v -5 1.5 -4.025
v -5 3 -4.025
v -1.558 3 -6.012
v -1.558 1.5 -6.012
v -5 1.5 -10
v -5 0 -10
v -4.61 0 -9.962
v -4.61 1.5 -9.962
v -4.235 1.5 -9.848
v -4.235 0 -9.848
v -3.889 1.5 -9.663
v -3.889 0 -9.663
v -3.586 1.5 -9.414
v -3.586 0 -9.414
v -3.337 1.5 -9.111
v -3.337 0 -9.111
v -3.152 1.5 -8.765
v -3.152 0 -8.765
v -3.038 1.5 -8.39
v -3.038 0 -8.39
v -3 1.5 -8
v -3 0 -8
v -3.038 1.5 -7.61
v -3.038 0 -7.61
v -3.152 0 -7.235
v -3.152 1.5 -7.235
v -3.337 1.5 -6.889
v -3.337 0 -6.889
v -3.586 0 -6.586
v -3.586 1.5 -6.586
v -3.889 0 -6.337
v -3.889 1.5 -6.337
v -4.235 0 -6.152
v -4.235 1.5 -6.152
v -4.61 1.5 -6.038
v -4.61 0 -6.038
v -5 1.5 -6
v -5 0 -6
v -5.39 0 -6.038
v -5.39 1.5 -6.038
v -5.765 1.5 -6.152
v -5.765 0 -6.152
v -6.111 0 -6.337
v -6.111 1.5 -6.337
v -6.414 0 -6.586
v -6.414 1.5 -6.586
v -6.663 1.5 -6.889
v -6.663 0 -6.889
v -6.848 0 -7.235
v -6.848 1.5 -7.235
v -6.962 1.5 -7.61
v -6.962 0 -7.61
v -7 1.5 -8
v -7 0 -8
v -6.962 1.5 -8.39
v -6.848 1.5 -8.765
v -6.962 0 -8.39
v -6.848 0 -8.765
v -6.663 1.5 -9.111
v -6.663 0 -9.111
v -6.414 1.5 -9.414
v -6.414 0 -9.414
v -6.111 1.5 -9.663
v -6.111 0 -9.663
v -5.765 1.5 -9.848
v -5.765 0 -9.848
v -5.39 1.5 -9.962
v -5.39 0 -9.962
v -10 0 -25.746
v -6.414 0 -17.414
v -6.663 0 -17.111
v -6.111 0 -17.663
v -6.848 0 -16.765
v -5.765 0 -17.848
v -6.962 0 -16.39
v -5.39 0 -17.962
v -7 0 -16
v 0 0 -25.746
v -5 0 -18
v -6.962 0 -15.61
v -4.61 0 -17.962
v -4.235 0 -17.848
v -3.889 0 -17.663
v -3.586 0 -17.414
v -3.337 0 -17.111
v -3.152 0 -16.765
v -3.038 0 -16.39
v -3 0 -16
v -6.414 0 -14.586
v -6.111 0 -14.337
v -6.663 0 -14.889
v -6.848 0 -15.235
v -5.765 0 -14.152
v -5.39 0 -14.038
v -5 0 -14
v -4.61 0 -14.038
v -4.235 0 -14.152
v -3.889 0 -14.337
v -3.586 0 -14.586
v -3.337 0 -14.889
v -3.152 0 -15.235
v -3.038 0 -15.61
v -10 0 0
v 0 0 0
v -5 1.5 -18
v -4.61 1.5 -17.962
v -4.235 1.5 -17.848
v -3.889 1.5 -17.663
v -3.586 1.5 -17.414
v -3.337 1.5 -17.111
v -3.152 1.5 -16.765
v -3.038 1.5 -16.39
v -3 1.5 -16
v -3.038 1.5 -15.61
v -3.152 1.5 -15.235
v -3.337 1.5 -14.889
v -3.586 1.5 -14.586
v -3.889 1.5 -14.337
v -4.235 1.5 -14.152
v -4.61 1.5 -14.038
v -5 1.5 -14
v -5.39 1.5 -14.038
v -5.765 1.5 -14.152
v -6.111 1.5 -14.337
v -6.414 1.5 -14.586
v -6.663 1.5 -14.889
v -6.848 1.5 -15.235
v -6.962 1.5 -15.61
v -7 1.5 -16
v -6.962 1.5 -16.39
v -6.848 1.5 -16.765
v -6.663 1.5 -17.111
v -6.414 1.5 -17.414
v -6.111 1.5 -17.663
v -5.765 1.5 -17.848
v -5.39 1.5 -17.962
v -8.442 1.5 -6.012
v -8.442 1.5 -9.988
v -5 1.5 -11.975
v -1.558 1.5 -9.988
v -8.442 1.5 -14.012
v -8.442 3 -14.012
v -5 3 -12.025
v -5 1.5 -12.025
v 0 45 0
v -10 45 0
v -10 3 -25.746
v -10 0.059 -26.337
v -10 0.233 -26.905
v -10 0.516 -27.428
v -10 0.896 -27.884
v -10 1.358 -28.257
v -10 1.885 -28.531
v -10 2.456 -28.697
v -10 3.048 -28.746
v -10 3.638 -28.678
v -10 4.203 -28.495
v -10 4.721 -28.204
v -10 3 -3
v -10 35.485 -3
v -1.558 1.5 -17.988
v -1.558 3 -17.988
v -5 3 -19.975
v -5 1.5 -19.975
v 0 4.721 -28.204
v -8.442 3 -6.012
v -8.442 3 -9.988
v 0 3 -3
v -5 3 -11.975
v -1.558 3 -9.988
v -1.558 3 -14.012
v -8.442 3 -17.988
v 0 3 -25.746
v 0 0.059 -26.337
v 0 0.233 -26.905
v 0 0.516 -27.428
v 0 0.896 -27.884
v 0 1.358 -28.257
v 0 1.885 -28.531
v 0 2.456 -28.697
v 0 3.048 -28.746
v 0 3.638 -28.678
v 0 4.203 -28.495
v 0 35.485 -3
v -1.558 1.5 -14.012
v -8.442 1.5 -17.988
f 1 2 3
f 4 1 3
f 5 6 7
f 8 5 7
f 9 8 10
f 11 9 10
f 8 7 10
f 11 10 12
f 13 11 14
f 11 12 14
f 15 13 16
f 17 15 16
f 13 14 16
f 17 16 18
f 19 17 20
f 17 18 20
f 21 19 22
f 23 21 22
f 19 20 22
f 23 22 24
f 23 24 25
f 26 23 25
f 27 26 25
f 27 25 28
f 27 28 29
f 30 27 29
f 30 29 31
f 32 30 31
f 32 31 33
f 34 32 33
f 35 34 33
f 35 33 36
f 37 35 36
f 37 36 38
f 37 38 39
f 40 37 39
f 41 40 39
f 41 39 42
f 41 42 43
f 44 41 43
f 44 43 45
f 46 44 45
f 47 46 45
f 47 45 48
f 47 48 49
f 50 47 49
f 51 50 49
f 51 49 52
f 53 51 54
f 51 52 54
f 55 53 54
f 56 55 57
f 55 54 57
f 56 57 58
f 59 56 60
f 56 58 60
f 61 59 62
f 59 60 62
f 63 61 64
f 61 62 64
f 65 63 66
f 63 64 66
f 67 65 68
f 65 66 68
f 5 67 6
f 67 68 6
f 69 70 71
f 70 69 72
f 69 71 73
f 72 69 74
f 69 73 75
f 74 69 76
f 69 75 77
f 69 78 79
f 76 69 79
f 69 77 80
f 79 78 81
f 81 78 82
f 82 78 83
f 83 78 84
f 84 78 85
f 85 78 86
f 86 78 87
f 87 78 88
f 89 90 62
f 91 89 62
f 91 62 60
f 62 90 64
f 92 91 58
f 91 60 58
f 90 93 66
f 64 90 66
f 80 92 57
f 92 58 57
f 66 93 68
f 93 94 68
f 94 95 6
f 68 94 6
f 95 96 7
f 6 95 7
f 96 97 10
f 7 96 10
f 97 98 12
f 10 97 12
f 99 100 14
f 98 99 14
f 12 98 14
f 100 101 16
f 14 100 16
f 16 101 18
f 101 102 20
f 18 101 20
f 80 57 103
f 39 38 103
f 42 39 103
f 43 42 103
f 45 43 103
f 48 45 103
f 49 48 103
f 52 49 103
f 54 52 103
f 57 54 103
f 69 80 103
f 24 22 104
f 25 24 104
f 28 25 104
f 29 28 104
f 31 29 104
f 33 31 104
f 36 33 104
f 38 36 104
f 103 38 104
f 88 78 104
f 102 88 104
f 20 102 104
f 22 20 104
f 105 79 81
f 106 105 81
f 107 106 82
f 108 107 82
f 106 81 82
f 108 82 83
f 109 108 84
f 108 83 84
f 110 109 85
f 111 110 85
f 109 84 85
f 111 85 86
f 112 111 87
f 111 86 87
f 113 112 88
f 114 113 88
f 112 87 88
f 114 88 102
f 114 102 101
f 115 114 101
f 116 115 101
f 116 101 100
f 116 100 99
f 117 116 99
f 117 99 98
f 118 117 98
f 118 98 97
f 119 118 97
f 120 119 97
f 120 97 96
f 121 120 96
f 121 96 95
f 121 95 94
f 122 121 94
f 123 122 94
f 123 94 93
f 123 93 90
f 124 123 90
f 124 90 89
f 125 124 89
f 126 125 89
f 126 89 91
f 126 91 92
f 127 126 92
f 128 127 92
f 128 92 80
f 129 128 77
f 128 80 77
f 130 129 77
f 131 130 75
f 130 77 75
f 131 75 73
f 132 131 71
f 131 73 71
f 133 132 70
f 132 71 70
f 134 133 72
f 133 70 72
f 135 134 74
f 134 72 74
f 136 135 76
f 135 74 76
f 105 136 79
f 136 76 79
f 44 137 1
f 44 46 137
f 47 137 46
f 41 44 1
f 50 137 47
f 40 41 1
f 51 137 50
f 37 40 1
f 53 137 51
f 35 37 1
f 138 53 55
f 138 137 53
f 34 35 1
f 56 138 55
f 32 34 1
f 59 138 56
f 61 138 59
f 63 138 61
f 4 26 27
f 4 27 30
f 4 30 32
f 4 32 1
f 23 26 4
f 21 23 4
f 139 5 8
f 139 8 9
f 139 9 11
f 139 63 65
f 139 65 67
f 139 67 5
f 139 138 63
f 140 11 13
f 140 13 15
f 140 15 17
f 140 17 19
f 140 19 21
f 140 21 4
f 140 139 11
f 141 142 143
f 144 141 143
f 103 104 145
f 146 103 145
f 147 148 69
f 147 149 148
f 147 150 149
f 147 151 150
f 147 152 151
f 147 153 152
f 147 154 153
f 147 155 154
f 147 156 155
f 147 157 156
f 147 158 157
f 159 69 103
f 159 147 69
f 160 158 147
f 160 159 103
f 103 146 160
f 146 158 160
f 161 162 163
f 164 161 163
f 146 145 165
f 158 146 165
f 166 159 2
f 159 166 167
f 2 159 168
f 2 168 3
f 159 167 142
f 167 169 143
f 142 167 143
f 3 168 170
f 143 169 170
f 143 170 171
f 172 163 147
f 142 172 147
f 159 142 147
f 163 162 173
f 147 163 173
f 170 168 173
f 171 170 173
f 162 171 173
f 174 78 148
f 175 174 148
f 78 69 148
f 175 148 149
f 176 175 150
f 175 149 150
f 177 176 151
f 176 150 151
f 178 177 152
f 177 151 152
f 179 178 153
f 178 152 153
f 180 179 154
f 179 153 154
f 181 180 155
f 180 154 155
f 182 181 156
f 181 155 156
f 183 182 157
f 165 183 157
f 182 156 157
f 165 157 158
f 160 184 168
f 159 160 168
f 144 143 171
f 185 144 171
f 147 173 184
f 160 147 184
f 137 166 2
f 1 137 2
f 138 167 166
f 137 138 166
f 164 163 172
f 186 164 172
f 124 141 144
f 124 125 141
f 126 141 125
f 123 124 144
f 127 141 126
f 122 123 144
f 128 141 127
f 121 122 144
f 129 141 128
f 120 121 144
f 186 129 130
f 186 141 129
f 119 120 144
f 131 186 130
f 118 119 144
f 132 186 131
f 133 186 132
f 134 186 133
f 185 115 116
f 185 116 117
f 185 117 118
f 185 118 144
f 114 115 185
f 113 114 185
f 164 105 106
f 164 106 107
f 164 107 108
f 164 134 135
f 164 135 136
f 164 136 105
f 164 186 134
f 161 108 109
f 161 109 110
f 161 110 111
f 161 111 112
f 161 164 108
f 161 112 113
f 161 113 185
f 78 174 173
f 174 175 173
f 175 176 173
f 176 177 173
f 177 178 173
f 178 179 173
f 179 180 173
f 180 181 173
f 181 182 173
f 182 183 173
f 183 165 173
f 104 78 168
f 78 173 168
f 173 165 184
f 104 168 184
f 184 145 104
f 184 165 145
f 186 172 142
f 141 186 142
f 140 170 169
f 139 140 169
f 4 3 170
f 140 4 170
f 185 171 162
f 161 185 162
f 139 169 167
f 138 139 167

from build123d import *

# Parameters (mm, degrees)
BOSS_EXTRUDE1_DEPTH = 10
CUT_EXTRUDE1_DEPTH  = 56.837607918
SKETCH3_R           = 2
CUT_EXTRUDE2_DEPTH  = 3
CUT_EXTRUDE3_DEPTH  = 1.5
FILLET1_R           = 3


with BuildPart() as part:
    # Sketch1 → Boss-Extrude1 (new body)
    with BuildSketch(Plane(origin=(0, 0, 0), x_dir=(0, 0, -1), z_dir=(1, 0, 0))):
        Polygon((0, 0), (0, 45), (31.509339219, 0), align=None)
    extrude(amount=-BOSS_EXTRUDE1_DEPTH)

    # Sketch2 → Cut-Extrude1 (cut, through all)
    with BuildSketch(Plane(origin=(0, 0, 0), x_dir=(0, 0, -1), z_dir=(1, 0, 0))):
        Polygon((25.746392839, 3), (3, 35.485215593), (3, 3), align=None)
    extrude(amount=-CUT_EXTRUDE1_DEPTH, mode=Mode.SUBTRACT)

    # Sketch3 → Cut-Extrude2 (cut)
    with BuildSketch(Plane.XZ):
        with Locations(Location((-5, -8, 0), (0, 0, 270))):
            Circle(SKETCH3_R)
        with Locations(Location((-5, -16, 0), (0, 0, 270))):
            Circle(SKETCH3_R)
    extrude(amount=-CUT_EXTRUDE2_DEPTH, mode=Mode.SUBTRACT)

    # Sketch4 → Cut-Extrude3 (cut)
    with BuildSketch(Plane(origin=(0, 3, 0), x_dir=(1, 0, 0), z_dir=(0, 1, 0))):
        Polygon((-5, 12.025), (-1.55754902, 14.0125), (-1.55754902, 17.9875), (-5, 19.975), (-8.44245098, 17.9875), (-8.44245098, 14.0125), align=None)
        Polygon((-5, 11.975), (-8.44245098, 9.9875), (-8.44245098, 6.0125), (-5, 4.025), (-1.55754902, 6.0125), (-1.55754902, 9.9875), align=None)
    extrude(amount=-CUT_EXTRUDE3_DEPTH, mode=Mode.SUBTRACT)

    # Fillet1
    fillet1_edges = [part.edges().sort_by_distance(p)[0] for p in [
        (-5, 0, -31.509339219),
    ]]
    fillet(fillet1_edges, radius=FILLET1_R)


solid = part.part
